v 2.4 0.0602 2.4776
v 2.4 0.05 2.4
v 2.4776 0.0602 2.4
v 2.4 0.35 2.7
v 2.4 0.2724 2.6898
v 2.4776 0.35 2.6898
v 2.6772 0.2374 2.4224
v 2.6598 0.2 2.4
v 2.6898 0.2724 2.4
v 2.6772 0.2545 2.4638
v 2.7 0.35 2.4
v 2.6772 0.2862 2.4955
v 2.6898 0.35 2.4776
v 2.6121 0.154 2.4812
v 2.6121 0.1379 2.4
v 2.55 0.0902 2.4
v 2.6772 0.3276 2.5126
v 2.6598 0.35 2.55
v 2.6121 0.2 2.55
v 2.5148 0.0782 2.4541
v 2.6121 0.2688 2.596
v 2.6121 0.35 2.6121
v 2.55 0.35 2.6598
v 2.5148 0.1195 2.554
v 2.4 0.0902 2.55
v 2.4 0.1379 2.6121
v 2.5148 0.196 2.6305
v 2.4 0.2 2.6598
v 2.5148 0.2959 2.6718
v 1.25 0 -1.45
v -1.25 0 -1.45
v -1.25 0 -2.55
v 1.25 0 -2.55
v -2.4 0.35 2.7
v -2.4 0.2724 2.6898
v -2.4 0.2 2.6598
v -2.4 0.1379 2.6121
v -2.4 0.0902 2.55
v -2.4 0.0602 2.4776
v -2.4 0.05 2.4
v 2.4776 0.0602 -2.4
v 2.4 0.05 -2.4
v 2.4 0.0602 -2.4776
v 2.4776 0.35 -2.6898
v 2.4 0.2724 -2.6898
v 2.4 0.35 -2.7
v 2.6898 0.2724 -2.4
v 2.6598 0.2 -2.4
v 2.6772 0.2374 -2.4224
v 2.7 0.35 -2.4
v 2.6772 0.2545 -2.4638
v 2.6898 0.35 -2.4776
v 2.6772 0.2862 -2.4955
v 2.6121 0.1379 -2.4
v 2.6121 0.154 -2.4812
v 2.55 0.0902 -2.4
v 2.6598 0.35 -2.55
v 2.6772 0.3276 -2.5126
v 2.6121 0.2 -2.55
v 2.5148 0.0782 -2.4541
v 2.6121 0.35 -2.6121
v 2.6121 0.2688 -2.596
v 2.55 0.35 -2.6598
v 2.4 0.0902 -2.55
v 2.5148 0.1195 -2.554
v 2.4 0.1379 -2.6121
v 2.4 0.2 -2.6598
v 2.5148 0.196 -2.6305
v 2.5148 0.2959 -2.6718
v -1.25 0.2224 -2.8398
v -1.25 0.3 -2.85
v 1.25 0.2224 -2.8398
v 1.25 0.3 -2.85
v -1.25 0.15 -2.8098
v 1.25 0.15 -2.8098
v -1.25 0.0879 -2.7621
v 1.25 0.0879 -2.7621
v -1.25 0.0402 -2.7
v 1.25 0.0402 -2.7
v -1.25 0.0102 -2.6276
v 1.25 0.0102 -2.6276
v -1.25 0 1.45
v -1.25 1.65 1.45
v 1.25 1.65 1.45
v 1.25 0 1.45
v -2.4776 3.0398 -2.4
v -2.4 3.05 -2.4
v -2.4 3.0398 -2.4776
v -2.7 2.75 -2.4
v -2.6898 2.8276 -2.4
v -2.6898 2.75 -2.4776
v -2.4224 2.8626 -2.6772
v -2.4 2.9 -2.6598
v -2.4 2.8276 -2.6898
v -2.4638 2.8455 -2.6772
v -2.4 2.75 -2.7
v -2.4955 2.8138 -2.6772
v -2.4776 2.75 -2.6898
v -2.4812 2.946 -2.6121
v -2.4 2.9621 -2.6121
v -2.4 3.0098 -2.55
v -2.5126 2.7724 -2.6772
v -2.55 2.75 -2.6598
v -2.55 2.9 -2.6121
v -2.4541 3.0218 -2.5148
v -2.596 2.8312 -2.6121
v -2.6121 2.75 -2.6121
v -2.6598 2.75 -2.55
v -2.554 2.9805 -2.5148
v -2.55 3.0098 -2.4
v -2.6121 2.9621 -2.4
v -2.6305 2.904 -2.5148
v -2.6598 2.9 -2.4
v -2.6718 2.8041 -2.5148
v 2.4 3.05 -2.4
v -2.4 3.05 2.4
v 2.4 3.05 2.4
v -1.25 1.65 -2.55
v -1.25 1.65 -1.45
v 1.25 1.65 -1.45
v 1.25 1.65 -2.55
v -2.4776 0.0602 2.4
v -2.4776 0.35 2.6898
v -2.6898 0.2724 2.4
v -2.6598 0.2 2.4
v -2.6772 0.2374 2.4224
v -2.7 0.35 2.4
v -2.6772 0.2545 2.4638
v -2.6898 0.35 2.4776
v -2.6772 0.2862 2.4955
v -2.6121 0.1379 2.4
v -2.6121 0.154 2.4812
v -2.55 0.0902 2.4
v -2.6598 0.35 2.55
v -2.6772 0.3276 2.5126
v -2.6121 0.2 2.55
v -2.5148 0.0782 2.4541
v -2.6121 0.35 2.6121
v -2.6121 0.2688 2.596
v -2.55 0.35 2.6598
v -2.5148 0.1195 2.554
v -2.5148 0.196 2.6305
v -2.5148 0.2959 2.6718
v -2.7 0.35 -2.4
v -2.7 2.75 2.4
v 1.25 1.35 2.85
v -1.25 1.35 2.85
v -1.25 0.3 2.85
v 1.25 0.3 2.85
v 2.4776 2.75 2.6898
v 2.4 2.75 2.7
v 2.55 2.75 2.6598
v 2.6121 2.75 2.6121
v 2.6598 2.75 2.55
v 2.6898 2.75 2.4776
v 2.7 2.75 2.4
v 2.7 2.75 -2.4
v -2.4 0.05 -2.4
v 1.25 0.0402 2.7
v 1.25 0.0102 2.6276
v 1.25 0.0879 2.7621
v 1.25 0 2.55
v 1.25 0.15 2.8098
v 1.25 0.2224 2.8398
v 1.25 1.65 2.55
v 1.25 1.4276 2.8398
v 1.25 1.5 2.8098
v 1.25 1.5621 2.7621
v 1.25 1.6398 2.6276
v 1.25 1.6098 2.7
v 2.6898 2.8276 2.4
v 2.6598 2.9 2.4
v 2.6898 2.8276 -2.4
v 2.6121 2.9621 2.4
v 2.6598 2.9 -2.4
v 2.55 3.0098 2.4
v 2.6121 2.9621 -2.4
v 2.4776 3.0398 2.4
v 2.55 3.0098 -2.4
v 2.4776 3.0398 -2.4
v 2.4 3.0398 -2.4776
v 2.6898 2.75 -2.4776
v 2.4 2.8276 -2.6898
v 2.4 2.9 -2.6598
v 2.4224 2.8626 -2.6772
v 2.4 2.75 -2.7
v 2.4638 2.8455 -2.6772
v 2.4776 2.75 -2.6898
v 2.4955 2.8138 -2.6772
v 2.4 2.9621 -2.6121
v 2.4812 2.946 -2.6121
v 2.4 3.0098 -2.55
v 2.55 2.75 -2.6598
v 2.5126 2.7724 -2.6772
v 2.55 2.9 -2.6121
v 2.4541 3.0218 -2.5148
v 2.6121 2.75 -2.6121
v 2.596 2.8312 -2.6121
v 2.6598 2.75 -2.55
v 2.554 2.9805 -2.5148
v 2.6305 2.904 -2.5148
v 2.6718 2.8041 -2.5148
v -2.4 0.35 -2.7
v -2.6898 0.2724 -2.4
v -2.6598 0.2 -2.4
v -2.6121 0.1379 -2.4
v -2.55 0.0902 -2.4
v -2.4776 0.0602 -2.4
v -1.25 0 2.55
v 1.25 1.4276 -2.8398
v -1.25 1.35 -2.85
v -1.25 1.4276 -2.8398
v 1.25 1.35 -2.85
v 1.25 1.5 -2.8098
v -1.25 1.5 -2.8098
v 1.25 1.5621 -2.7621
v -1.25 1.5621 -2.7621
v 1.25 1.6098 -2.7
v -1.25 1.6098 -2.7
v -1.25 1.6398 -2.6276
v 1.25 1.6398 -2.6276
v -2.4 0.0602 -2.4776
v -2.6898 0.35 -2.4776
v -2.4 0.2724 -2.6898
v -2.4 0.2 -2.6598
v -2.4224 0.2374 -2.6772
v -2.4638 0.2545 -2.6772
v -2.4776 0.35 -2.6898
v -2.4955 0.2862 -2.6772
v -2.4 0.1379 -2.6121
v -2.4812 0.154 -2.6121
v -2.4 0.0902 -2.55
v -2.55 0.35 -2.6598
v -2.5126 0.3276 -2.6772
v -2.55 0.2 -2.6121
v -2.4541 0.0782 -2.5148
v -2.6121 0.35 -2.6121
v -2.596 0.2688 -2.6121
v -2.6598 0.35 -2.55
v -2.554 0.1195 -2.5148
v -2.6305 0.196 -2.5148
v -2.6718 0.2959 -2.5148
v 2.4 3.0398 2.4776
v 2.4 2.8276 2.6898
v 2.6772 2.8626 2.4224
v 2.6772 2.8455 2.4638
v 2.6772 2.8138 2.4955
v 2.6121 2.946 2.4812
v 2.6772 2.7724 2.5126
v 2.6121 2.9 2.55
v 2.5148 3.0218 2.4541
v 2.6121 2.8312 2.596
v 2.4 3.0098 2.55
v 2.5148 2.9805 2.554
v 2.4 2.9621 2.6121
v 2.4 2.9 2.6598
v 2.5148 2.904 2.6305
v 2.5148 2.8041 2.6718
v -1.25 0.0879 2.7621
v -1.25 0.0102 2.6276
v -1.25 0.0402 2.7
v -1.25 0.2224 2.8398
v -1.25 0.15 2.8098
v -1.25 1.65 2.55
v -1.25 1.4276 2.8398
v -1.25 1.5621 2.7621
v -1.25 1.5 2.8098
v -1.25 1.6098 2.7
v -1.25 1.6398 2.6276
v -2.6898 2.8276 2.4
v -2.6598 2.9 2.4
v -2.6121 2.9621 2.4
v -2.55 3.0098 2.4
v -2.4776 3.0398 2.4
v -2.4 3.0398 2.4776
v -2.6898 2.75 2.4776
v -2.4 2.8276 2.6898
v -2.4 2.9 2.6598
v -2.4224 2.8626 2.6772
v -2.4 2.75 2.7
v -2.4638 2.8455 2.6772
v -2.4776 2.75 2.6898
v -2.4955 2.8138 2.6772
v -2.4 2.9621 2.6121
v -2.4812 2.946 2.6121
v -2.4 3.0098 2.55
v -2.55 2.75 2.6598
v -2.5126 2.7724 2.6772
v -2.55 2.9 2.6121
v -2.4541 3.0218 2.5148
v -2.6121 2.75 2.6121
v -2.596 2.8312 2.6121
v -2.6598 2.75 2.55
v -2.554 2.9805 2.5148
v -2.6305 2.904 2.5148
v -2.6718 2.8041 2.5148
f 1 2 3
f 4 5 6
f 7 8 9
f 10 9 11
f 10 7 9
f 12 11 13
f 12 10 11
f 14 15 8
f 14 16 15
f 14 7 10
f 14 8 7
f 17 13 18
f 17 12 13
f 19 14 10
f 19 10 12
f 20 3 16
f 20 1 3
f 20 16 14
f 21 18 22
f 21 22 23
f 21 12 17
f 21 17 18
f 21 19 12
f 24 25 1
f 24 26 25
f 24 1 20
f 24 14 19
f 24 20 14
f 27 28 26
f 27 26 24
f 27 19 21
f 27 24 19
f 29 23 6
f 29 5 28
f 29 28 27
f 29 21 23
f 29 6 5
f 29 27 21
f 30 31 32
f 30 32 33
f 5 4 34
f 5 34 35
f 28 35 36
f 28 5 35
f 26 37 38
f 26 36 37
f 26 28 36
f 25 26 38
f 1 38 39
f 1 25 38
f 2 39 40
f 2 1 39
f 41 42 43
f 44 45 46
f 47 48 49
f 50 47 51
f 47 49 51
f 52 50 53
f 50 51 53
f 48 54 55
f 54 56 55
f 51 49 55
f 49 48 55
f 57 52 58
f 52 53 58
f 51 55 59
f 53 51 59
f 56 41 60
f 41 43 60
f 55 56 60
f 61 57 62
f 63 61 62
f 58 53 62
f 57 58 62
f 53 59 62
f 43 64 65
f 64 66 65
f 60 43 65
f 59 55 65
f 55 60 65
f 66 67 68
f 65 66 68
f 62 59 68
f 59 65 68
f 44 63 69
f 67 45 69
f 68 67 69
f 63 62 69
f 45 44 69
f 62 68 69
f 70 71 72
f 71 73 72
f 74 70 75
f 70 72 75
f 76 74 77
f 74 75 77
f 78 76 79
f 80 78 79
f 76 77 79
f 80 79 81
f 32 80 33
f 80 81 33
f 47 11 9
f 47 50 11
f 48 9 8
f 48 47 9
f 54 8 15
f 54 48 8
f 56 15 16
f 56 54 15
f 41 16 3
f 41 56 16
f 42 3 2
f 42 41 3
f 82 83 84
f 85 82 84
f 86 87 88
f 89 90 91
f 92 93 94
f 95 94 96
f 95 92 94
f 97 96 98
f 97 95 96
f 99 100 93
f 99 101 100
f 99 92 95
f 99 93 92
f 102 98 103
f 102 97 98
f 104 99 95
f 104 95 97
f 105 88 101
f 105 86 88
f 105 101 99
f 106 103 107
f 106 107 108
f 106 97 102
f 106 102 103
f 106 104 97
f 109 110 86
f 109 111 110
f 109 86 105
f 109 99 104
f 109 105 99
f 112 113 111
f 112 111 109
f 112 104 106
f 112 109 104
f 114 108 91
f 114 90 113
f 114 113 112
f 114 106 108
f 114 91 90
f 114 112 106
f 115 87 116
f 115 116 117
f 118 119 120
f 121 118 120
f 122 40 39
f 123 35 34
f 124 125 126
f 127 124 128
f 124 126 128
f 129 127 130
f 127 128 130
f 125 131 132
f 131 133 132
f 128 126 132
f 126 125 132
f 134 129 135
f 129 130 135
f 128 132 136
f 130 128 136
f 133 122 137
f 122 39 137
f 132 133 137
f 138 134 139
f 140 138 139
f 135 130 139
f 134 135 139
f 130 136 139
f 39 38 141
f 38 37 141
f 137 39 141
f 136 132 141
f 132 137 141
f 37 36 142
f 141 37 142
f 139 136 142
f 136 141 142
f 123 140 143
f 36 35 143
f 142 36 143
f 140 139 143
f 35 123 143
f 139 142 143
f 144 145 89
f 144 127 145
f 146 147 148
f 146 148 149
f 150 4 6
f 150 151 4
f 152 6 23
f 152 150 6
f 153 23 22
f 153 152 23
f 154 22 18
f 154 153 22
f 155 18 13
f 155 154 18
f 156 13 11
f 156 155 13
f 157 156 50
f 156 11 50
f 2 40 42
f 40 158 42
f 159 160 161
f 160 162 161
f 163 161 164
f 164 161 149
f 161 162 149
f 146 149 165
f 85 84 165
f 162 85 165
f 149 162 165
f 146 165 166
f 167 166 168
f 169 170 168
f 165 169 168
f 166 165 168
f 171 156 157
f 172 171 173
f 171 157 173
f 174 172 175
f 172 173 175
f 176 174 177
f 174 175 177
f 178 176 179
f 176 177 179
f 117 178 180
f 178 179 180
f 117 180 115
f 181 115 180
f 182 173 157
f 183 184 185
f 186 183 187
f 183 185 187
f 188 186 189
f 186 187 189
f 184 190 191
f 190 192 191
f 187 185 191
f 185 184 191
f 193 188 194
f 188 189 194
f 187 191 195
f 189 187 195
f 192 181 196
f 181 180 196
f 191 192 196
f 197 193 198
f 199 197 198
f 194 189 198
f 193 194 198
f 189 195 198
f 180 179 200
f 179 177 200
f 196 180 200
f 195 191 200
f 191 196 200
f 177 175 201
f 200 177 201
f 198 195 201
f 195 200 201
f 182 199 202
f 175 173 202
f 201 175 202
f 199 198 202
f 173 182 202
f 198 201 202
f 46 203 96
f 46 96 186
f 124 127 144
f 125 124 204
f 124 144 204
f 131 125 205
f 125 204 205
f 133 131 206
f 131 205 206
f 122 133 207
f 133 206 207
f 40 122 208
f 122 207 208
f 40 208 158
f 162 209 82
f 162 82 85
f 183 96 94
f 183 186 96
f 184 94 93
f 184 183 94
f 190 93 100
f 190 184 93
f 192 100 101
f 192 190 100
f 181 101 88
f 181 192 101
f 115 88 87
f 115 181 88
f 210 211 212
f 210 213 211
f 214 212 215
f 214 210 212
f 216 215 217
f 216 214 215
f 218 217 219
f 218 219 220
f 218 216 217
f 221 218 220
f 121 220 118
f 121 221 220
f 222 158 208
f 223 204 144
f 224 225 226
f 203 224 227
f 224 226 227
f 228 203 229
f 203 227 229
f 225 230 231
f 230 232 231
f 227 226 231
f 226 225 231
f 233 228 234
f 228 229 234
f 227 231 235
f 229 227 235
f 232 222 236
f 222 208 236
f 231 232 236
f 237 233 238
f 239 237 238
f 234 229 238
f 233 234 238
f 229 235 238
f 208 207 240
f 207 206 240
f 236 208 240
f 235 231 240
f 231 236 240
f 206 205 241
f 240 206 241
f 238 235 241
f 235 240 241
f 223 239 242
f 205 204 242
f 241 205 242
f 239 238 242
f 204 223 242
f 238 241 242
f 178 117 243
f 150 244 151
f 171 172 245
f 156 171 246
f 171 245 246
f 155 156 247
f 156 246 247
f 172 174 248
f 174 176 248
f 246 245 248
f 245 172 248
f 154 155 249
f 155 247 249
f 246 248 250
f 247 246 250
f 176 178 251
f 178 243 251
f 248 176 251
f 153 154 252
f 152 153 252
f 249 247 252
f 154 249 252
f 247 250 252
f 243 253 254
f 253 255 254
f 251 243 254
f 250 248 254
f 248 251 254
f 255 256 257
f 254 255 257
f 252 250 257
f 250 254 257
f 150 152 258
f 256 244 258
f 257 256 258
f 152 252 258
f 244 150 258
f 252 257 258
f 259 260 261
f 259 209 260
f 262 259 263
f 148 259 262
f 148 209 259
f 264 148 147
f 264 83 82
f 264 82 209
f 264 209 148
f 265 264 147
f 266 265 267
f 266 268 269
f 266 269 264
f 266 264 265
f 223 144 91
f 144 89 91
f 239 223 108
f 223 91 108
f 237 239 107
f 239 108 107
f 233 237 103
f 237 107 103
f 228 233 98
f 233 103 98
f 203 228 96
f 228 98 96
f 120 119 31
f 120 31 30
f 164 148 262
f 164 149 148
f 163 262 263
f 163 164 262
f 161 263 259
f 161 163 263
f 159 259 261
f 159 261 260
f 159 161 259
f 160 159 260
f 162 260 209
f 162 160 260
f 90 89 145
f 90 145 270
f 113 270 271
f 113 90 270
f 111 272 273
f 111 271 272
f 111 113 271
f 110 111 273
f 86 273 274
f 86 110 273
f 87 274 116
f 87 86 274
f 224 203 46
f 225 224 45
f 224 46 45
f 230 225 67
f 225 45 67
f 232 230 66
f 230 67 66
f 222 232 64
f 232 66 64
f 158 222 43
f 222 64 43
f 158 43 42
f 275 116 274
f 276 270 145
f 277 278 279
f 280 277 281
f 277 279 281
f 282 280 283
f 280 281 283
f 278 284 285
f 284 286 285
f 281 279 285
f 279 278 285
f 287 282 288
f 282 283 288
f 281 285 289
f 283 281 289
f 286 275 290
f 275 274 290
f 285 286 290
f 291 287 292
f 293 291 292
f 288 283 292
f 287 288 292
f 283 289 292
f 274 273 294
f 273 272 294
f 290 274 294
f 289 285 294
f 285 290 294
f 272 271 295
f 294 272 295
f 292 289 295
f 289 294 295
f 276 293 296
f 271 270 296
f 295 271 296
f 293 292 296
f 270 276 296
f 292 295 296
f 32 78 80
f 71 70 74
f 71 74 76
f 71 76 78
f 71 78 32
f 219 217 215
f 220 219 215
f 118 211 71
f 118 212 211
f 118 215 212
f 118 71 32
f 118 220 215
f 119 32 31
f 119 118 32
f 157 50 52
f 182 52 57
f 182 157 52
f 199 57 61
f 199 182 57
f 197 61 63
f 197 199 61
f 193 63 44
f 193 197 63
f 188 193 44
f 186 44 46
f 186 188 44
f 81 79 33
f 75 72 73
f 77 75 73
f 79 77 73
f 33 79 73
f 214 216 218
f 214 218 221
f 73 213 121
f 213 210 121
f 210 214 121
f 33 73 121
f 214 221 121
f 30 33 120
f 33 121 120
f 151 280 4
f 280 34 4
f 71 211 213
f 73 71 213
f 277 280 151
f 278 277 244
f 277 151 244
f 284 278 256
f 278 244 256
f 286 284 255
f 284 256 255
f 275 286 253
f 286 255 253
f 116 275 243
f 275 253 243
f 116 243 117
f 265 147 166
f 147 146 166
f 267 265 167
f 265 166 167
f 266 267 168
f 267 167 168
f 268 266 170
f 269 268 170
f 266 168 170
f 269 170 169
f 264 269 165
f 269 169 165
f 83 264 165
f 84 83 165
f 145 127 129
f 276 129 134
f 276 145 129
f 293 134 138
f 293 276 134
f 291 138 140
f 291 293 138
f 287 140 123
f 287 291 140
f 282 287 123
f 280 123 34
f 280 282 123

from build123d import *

# Parameters (mm, degrees)
SKETCH_1_W             = 5.4
SKETCH_1_H             = 5.4
EXTRUDE_1_DEPTH        = 3
FILLET_1_R             = 0.3
EXTRUDE_2_DEPTH        = 0.05
EXTRUDE_2_DEPTH_BACK   = 1.6
SKETCH_2_W             = 2.5
SKETCH_2_H             = 1.4
EXTRUDE_2_2_DEPTH      = 0.05
EXTRUDE_2_2_DEPTH_BACK = 1.6
FILLET_2_R             = 0.3
FILLET_3_R             = 0.3


with BuildPart() as part:
    # Эскиз1 → Бобышка-Вытянуть1 (new body)
    with BuildSketch(Plane(origin=(0, 0.05, 0), x_dir=(1, 0, 0), z_dir=(0, 1, 0))):
        Rectangle(SKETCH_1_W, SKETCH_1_H)
    extrude(amount=EXTRUDE_1_DEPTH)

    # Скругление1
    fillet_1_edges = [part.edges().sort_by_distance(p)[0] for p in [
        (-2.7, 3.05, 0),
        (0, 3.05, 2.7),
        (2.7, 3.05, 0),
        (0, 0.05, 2.7),
        (-2.7, 0.05, 0),
        (0, 0.05, -2.7),
        (2.7, 0.05, 0),
        (0, 3.05, -2.7),
        (2.7, 1.55, 2.7),
        (-2.7, 1.55, 2.7),
        (-2.7, 1.55, -2.7),
        (2.7, 1.55, -2.7),
    ]]
    fillet(fillet_1_edges, radius=FILLET_1_R)


with BuildPart() as body_2:
    # Эскиз2 → Бобышка-Вытянуть2 (new, two sides: drawn at the far end of the back side and taken through both)
    with BuildSketch(Plane.XZ.offset(-0.05).offset(-EXTRUDE_2_DEPTH_BACK)):
        with Locations((0, 2.15)):
            Rectangle(SKETCH_2_W, SKETCH_2_H)
    extrude(amount=EXTRUDE_2_DEPTH + EXTRUDE_2_DEPTH_BACK)

    # Скругление2
    fillet_2_edges = [body_2.edges().sort_by_distance(p)[0] for p in [
        (0, 1.65, 2.85),
        (0, 0, 2.85),
    ]]
    fillet(fillet_2_edges, radius=FILLET_2_R)


with BuildPart() as body_3:
    # Эскиз2 → Extrude 2 2 (new, two sides: drawn at the far end of the back side and taken through both)
    with BuildSketch(Plane.XZ.offset(-0.05).offset(-EXTRUDE_2_2_DEPTH_BACK)):
        with Locations((0, -2.15)):
            Rectangle(SKETCH_2_W, SKETCH_2_H)
    extrude(amount=EXTRUDE_2_2_DEPTH + EXTRUDE_2_2_DEPTH_BACK)

    # Скругление3
    fillet_3_edges = [body_3.edges().sort_by_distance(p)[0] for p in [
        (0, 0, -2.85),
        (0, 1.65, -2.85),
    ]]
    fillet(fillet_3_edges, radius=FILLET_3_R)


solid = Compound([part.part, body_2.part, body_3.part])
